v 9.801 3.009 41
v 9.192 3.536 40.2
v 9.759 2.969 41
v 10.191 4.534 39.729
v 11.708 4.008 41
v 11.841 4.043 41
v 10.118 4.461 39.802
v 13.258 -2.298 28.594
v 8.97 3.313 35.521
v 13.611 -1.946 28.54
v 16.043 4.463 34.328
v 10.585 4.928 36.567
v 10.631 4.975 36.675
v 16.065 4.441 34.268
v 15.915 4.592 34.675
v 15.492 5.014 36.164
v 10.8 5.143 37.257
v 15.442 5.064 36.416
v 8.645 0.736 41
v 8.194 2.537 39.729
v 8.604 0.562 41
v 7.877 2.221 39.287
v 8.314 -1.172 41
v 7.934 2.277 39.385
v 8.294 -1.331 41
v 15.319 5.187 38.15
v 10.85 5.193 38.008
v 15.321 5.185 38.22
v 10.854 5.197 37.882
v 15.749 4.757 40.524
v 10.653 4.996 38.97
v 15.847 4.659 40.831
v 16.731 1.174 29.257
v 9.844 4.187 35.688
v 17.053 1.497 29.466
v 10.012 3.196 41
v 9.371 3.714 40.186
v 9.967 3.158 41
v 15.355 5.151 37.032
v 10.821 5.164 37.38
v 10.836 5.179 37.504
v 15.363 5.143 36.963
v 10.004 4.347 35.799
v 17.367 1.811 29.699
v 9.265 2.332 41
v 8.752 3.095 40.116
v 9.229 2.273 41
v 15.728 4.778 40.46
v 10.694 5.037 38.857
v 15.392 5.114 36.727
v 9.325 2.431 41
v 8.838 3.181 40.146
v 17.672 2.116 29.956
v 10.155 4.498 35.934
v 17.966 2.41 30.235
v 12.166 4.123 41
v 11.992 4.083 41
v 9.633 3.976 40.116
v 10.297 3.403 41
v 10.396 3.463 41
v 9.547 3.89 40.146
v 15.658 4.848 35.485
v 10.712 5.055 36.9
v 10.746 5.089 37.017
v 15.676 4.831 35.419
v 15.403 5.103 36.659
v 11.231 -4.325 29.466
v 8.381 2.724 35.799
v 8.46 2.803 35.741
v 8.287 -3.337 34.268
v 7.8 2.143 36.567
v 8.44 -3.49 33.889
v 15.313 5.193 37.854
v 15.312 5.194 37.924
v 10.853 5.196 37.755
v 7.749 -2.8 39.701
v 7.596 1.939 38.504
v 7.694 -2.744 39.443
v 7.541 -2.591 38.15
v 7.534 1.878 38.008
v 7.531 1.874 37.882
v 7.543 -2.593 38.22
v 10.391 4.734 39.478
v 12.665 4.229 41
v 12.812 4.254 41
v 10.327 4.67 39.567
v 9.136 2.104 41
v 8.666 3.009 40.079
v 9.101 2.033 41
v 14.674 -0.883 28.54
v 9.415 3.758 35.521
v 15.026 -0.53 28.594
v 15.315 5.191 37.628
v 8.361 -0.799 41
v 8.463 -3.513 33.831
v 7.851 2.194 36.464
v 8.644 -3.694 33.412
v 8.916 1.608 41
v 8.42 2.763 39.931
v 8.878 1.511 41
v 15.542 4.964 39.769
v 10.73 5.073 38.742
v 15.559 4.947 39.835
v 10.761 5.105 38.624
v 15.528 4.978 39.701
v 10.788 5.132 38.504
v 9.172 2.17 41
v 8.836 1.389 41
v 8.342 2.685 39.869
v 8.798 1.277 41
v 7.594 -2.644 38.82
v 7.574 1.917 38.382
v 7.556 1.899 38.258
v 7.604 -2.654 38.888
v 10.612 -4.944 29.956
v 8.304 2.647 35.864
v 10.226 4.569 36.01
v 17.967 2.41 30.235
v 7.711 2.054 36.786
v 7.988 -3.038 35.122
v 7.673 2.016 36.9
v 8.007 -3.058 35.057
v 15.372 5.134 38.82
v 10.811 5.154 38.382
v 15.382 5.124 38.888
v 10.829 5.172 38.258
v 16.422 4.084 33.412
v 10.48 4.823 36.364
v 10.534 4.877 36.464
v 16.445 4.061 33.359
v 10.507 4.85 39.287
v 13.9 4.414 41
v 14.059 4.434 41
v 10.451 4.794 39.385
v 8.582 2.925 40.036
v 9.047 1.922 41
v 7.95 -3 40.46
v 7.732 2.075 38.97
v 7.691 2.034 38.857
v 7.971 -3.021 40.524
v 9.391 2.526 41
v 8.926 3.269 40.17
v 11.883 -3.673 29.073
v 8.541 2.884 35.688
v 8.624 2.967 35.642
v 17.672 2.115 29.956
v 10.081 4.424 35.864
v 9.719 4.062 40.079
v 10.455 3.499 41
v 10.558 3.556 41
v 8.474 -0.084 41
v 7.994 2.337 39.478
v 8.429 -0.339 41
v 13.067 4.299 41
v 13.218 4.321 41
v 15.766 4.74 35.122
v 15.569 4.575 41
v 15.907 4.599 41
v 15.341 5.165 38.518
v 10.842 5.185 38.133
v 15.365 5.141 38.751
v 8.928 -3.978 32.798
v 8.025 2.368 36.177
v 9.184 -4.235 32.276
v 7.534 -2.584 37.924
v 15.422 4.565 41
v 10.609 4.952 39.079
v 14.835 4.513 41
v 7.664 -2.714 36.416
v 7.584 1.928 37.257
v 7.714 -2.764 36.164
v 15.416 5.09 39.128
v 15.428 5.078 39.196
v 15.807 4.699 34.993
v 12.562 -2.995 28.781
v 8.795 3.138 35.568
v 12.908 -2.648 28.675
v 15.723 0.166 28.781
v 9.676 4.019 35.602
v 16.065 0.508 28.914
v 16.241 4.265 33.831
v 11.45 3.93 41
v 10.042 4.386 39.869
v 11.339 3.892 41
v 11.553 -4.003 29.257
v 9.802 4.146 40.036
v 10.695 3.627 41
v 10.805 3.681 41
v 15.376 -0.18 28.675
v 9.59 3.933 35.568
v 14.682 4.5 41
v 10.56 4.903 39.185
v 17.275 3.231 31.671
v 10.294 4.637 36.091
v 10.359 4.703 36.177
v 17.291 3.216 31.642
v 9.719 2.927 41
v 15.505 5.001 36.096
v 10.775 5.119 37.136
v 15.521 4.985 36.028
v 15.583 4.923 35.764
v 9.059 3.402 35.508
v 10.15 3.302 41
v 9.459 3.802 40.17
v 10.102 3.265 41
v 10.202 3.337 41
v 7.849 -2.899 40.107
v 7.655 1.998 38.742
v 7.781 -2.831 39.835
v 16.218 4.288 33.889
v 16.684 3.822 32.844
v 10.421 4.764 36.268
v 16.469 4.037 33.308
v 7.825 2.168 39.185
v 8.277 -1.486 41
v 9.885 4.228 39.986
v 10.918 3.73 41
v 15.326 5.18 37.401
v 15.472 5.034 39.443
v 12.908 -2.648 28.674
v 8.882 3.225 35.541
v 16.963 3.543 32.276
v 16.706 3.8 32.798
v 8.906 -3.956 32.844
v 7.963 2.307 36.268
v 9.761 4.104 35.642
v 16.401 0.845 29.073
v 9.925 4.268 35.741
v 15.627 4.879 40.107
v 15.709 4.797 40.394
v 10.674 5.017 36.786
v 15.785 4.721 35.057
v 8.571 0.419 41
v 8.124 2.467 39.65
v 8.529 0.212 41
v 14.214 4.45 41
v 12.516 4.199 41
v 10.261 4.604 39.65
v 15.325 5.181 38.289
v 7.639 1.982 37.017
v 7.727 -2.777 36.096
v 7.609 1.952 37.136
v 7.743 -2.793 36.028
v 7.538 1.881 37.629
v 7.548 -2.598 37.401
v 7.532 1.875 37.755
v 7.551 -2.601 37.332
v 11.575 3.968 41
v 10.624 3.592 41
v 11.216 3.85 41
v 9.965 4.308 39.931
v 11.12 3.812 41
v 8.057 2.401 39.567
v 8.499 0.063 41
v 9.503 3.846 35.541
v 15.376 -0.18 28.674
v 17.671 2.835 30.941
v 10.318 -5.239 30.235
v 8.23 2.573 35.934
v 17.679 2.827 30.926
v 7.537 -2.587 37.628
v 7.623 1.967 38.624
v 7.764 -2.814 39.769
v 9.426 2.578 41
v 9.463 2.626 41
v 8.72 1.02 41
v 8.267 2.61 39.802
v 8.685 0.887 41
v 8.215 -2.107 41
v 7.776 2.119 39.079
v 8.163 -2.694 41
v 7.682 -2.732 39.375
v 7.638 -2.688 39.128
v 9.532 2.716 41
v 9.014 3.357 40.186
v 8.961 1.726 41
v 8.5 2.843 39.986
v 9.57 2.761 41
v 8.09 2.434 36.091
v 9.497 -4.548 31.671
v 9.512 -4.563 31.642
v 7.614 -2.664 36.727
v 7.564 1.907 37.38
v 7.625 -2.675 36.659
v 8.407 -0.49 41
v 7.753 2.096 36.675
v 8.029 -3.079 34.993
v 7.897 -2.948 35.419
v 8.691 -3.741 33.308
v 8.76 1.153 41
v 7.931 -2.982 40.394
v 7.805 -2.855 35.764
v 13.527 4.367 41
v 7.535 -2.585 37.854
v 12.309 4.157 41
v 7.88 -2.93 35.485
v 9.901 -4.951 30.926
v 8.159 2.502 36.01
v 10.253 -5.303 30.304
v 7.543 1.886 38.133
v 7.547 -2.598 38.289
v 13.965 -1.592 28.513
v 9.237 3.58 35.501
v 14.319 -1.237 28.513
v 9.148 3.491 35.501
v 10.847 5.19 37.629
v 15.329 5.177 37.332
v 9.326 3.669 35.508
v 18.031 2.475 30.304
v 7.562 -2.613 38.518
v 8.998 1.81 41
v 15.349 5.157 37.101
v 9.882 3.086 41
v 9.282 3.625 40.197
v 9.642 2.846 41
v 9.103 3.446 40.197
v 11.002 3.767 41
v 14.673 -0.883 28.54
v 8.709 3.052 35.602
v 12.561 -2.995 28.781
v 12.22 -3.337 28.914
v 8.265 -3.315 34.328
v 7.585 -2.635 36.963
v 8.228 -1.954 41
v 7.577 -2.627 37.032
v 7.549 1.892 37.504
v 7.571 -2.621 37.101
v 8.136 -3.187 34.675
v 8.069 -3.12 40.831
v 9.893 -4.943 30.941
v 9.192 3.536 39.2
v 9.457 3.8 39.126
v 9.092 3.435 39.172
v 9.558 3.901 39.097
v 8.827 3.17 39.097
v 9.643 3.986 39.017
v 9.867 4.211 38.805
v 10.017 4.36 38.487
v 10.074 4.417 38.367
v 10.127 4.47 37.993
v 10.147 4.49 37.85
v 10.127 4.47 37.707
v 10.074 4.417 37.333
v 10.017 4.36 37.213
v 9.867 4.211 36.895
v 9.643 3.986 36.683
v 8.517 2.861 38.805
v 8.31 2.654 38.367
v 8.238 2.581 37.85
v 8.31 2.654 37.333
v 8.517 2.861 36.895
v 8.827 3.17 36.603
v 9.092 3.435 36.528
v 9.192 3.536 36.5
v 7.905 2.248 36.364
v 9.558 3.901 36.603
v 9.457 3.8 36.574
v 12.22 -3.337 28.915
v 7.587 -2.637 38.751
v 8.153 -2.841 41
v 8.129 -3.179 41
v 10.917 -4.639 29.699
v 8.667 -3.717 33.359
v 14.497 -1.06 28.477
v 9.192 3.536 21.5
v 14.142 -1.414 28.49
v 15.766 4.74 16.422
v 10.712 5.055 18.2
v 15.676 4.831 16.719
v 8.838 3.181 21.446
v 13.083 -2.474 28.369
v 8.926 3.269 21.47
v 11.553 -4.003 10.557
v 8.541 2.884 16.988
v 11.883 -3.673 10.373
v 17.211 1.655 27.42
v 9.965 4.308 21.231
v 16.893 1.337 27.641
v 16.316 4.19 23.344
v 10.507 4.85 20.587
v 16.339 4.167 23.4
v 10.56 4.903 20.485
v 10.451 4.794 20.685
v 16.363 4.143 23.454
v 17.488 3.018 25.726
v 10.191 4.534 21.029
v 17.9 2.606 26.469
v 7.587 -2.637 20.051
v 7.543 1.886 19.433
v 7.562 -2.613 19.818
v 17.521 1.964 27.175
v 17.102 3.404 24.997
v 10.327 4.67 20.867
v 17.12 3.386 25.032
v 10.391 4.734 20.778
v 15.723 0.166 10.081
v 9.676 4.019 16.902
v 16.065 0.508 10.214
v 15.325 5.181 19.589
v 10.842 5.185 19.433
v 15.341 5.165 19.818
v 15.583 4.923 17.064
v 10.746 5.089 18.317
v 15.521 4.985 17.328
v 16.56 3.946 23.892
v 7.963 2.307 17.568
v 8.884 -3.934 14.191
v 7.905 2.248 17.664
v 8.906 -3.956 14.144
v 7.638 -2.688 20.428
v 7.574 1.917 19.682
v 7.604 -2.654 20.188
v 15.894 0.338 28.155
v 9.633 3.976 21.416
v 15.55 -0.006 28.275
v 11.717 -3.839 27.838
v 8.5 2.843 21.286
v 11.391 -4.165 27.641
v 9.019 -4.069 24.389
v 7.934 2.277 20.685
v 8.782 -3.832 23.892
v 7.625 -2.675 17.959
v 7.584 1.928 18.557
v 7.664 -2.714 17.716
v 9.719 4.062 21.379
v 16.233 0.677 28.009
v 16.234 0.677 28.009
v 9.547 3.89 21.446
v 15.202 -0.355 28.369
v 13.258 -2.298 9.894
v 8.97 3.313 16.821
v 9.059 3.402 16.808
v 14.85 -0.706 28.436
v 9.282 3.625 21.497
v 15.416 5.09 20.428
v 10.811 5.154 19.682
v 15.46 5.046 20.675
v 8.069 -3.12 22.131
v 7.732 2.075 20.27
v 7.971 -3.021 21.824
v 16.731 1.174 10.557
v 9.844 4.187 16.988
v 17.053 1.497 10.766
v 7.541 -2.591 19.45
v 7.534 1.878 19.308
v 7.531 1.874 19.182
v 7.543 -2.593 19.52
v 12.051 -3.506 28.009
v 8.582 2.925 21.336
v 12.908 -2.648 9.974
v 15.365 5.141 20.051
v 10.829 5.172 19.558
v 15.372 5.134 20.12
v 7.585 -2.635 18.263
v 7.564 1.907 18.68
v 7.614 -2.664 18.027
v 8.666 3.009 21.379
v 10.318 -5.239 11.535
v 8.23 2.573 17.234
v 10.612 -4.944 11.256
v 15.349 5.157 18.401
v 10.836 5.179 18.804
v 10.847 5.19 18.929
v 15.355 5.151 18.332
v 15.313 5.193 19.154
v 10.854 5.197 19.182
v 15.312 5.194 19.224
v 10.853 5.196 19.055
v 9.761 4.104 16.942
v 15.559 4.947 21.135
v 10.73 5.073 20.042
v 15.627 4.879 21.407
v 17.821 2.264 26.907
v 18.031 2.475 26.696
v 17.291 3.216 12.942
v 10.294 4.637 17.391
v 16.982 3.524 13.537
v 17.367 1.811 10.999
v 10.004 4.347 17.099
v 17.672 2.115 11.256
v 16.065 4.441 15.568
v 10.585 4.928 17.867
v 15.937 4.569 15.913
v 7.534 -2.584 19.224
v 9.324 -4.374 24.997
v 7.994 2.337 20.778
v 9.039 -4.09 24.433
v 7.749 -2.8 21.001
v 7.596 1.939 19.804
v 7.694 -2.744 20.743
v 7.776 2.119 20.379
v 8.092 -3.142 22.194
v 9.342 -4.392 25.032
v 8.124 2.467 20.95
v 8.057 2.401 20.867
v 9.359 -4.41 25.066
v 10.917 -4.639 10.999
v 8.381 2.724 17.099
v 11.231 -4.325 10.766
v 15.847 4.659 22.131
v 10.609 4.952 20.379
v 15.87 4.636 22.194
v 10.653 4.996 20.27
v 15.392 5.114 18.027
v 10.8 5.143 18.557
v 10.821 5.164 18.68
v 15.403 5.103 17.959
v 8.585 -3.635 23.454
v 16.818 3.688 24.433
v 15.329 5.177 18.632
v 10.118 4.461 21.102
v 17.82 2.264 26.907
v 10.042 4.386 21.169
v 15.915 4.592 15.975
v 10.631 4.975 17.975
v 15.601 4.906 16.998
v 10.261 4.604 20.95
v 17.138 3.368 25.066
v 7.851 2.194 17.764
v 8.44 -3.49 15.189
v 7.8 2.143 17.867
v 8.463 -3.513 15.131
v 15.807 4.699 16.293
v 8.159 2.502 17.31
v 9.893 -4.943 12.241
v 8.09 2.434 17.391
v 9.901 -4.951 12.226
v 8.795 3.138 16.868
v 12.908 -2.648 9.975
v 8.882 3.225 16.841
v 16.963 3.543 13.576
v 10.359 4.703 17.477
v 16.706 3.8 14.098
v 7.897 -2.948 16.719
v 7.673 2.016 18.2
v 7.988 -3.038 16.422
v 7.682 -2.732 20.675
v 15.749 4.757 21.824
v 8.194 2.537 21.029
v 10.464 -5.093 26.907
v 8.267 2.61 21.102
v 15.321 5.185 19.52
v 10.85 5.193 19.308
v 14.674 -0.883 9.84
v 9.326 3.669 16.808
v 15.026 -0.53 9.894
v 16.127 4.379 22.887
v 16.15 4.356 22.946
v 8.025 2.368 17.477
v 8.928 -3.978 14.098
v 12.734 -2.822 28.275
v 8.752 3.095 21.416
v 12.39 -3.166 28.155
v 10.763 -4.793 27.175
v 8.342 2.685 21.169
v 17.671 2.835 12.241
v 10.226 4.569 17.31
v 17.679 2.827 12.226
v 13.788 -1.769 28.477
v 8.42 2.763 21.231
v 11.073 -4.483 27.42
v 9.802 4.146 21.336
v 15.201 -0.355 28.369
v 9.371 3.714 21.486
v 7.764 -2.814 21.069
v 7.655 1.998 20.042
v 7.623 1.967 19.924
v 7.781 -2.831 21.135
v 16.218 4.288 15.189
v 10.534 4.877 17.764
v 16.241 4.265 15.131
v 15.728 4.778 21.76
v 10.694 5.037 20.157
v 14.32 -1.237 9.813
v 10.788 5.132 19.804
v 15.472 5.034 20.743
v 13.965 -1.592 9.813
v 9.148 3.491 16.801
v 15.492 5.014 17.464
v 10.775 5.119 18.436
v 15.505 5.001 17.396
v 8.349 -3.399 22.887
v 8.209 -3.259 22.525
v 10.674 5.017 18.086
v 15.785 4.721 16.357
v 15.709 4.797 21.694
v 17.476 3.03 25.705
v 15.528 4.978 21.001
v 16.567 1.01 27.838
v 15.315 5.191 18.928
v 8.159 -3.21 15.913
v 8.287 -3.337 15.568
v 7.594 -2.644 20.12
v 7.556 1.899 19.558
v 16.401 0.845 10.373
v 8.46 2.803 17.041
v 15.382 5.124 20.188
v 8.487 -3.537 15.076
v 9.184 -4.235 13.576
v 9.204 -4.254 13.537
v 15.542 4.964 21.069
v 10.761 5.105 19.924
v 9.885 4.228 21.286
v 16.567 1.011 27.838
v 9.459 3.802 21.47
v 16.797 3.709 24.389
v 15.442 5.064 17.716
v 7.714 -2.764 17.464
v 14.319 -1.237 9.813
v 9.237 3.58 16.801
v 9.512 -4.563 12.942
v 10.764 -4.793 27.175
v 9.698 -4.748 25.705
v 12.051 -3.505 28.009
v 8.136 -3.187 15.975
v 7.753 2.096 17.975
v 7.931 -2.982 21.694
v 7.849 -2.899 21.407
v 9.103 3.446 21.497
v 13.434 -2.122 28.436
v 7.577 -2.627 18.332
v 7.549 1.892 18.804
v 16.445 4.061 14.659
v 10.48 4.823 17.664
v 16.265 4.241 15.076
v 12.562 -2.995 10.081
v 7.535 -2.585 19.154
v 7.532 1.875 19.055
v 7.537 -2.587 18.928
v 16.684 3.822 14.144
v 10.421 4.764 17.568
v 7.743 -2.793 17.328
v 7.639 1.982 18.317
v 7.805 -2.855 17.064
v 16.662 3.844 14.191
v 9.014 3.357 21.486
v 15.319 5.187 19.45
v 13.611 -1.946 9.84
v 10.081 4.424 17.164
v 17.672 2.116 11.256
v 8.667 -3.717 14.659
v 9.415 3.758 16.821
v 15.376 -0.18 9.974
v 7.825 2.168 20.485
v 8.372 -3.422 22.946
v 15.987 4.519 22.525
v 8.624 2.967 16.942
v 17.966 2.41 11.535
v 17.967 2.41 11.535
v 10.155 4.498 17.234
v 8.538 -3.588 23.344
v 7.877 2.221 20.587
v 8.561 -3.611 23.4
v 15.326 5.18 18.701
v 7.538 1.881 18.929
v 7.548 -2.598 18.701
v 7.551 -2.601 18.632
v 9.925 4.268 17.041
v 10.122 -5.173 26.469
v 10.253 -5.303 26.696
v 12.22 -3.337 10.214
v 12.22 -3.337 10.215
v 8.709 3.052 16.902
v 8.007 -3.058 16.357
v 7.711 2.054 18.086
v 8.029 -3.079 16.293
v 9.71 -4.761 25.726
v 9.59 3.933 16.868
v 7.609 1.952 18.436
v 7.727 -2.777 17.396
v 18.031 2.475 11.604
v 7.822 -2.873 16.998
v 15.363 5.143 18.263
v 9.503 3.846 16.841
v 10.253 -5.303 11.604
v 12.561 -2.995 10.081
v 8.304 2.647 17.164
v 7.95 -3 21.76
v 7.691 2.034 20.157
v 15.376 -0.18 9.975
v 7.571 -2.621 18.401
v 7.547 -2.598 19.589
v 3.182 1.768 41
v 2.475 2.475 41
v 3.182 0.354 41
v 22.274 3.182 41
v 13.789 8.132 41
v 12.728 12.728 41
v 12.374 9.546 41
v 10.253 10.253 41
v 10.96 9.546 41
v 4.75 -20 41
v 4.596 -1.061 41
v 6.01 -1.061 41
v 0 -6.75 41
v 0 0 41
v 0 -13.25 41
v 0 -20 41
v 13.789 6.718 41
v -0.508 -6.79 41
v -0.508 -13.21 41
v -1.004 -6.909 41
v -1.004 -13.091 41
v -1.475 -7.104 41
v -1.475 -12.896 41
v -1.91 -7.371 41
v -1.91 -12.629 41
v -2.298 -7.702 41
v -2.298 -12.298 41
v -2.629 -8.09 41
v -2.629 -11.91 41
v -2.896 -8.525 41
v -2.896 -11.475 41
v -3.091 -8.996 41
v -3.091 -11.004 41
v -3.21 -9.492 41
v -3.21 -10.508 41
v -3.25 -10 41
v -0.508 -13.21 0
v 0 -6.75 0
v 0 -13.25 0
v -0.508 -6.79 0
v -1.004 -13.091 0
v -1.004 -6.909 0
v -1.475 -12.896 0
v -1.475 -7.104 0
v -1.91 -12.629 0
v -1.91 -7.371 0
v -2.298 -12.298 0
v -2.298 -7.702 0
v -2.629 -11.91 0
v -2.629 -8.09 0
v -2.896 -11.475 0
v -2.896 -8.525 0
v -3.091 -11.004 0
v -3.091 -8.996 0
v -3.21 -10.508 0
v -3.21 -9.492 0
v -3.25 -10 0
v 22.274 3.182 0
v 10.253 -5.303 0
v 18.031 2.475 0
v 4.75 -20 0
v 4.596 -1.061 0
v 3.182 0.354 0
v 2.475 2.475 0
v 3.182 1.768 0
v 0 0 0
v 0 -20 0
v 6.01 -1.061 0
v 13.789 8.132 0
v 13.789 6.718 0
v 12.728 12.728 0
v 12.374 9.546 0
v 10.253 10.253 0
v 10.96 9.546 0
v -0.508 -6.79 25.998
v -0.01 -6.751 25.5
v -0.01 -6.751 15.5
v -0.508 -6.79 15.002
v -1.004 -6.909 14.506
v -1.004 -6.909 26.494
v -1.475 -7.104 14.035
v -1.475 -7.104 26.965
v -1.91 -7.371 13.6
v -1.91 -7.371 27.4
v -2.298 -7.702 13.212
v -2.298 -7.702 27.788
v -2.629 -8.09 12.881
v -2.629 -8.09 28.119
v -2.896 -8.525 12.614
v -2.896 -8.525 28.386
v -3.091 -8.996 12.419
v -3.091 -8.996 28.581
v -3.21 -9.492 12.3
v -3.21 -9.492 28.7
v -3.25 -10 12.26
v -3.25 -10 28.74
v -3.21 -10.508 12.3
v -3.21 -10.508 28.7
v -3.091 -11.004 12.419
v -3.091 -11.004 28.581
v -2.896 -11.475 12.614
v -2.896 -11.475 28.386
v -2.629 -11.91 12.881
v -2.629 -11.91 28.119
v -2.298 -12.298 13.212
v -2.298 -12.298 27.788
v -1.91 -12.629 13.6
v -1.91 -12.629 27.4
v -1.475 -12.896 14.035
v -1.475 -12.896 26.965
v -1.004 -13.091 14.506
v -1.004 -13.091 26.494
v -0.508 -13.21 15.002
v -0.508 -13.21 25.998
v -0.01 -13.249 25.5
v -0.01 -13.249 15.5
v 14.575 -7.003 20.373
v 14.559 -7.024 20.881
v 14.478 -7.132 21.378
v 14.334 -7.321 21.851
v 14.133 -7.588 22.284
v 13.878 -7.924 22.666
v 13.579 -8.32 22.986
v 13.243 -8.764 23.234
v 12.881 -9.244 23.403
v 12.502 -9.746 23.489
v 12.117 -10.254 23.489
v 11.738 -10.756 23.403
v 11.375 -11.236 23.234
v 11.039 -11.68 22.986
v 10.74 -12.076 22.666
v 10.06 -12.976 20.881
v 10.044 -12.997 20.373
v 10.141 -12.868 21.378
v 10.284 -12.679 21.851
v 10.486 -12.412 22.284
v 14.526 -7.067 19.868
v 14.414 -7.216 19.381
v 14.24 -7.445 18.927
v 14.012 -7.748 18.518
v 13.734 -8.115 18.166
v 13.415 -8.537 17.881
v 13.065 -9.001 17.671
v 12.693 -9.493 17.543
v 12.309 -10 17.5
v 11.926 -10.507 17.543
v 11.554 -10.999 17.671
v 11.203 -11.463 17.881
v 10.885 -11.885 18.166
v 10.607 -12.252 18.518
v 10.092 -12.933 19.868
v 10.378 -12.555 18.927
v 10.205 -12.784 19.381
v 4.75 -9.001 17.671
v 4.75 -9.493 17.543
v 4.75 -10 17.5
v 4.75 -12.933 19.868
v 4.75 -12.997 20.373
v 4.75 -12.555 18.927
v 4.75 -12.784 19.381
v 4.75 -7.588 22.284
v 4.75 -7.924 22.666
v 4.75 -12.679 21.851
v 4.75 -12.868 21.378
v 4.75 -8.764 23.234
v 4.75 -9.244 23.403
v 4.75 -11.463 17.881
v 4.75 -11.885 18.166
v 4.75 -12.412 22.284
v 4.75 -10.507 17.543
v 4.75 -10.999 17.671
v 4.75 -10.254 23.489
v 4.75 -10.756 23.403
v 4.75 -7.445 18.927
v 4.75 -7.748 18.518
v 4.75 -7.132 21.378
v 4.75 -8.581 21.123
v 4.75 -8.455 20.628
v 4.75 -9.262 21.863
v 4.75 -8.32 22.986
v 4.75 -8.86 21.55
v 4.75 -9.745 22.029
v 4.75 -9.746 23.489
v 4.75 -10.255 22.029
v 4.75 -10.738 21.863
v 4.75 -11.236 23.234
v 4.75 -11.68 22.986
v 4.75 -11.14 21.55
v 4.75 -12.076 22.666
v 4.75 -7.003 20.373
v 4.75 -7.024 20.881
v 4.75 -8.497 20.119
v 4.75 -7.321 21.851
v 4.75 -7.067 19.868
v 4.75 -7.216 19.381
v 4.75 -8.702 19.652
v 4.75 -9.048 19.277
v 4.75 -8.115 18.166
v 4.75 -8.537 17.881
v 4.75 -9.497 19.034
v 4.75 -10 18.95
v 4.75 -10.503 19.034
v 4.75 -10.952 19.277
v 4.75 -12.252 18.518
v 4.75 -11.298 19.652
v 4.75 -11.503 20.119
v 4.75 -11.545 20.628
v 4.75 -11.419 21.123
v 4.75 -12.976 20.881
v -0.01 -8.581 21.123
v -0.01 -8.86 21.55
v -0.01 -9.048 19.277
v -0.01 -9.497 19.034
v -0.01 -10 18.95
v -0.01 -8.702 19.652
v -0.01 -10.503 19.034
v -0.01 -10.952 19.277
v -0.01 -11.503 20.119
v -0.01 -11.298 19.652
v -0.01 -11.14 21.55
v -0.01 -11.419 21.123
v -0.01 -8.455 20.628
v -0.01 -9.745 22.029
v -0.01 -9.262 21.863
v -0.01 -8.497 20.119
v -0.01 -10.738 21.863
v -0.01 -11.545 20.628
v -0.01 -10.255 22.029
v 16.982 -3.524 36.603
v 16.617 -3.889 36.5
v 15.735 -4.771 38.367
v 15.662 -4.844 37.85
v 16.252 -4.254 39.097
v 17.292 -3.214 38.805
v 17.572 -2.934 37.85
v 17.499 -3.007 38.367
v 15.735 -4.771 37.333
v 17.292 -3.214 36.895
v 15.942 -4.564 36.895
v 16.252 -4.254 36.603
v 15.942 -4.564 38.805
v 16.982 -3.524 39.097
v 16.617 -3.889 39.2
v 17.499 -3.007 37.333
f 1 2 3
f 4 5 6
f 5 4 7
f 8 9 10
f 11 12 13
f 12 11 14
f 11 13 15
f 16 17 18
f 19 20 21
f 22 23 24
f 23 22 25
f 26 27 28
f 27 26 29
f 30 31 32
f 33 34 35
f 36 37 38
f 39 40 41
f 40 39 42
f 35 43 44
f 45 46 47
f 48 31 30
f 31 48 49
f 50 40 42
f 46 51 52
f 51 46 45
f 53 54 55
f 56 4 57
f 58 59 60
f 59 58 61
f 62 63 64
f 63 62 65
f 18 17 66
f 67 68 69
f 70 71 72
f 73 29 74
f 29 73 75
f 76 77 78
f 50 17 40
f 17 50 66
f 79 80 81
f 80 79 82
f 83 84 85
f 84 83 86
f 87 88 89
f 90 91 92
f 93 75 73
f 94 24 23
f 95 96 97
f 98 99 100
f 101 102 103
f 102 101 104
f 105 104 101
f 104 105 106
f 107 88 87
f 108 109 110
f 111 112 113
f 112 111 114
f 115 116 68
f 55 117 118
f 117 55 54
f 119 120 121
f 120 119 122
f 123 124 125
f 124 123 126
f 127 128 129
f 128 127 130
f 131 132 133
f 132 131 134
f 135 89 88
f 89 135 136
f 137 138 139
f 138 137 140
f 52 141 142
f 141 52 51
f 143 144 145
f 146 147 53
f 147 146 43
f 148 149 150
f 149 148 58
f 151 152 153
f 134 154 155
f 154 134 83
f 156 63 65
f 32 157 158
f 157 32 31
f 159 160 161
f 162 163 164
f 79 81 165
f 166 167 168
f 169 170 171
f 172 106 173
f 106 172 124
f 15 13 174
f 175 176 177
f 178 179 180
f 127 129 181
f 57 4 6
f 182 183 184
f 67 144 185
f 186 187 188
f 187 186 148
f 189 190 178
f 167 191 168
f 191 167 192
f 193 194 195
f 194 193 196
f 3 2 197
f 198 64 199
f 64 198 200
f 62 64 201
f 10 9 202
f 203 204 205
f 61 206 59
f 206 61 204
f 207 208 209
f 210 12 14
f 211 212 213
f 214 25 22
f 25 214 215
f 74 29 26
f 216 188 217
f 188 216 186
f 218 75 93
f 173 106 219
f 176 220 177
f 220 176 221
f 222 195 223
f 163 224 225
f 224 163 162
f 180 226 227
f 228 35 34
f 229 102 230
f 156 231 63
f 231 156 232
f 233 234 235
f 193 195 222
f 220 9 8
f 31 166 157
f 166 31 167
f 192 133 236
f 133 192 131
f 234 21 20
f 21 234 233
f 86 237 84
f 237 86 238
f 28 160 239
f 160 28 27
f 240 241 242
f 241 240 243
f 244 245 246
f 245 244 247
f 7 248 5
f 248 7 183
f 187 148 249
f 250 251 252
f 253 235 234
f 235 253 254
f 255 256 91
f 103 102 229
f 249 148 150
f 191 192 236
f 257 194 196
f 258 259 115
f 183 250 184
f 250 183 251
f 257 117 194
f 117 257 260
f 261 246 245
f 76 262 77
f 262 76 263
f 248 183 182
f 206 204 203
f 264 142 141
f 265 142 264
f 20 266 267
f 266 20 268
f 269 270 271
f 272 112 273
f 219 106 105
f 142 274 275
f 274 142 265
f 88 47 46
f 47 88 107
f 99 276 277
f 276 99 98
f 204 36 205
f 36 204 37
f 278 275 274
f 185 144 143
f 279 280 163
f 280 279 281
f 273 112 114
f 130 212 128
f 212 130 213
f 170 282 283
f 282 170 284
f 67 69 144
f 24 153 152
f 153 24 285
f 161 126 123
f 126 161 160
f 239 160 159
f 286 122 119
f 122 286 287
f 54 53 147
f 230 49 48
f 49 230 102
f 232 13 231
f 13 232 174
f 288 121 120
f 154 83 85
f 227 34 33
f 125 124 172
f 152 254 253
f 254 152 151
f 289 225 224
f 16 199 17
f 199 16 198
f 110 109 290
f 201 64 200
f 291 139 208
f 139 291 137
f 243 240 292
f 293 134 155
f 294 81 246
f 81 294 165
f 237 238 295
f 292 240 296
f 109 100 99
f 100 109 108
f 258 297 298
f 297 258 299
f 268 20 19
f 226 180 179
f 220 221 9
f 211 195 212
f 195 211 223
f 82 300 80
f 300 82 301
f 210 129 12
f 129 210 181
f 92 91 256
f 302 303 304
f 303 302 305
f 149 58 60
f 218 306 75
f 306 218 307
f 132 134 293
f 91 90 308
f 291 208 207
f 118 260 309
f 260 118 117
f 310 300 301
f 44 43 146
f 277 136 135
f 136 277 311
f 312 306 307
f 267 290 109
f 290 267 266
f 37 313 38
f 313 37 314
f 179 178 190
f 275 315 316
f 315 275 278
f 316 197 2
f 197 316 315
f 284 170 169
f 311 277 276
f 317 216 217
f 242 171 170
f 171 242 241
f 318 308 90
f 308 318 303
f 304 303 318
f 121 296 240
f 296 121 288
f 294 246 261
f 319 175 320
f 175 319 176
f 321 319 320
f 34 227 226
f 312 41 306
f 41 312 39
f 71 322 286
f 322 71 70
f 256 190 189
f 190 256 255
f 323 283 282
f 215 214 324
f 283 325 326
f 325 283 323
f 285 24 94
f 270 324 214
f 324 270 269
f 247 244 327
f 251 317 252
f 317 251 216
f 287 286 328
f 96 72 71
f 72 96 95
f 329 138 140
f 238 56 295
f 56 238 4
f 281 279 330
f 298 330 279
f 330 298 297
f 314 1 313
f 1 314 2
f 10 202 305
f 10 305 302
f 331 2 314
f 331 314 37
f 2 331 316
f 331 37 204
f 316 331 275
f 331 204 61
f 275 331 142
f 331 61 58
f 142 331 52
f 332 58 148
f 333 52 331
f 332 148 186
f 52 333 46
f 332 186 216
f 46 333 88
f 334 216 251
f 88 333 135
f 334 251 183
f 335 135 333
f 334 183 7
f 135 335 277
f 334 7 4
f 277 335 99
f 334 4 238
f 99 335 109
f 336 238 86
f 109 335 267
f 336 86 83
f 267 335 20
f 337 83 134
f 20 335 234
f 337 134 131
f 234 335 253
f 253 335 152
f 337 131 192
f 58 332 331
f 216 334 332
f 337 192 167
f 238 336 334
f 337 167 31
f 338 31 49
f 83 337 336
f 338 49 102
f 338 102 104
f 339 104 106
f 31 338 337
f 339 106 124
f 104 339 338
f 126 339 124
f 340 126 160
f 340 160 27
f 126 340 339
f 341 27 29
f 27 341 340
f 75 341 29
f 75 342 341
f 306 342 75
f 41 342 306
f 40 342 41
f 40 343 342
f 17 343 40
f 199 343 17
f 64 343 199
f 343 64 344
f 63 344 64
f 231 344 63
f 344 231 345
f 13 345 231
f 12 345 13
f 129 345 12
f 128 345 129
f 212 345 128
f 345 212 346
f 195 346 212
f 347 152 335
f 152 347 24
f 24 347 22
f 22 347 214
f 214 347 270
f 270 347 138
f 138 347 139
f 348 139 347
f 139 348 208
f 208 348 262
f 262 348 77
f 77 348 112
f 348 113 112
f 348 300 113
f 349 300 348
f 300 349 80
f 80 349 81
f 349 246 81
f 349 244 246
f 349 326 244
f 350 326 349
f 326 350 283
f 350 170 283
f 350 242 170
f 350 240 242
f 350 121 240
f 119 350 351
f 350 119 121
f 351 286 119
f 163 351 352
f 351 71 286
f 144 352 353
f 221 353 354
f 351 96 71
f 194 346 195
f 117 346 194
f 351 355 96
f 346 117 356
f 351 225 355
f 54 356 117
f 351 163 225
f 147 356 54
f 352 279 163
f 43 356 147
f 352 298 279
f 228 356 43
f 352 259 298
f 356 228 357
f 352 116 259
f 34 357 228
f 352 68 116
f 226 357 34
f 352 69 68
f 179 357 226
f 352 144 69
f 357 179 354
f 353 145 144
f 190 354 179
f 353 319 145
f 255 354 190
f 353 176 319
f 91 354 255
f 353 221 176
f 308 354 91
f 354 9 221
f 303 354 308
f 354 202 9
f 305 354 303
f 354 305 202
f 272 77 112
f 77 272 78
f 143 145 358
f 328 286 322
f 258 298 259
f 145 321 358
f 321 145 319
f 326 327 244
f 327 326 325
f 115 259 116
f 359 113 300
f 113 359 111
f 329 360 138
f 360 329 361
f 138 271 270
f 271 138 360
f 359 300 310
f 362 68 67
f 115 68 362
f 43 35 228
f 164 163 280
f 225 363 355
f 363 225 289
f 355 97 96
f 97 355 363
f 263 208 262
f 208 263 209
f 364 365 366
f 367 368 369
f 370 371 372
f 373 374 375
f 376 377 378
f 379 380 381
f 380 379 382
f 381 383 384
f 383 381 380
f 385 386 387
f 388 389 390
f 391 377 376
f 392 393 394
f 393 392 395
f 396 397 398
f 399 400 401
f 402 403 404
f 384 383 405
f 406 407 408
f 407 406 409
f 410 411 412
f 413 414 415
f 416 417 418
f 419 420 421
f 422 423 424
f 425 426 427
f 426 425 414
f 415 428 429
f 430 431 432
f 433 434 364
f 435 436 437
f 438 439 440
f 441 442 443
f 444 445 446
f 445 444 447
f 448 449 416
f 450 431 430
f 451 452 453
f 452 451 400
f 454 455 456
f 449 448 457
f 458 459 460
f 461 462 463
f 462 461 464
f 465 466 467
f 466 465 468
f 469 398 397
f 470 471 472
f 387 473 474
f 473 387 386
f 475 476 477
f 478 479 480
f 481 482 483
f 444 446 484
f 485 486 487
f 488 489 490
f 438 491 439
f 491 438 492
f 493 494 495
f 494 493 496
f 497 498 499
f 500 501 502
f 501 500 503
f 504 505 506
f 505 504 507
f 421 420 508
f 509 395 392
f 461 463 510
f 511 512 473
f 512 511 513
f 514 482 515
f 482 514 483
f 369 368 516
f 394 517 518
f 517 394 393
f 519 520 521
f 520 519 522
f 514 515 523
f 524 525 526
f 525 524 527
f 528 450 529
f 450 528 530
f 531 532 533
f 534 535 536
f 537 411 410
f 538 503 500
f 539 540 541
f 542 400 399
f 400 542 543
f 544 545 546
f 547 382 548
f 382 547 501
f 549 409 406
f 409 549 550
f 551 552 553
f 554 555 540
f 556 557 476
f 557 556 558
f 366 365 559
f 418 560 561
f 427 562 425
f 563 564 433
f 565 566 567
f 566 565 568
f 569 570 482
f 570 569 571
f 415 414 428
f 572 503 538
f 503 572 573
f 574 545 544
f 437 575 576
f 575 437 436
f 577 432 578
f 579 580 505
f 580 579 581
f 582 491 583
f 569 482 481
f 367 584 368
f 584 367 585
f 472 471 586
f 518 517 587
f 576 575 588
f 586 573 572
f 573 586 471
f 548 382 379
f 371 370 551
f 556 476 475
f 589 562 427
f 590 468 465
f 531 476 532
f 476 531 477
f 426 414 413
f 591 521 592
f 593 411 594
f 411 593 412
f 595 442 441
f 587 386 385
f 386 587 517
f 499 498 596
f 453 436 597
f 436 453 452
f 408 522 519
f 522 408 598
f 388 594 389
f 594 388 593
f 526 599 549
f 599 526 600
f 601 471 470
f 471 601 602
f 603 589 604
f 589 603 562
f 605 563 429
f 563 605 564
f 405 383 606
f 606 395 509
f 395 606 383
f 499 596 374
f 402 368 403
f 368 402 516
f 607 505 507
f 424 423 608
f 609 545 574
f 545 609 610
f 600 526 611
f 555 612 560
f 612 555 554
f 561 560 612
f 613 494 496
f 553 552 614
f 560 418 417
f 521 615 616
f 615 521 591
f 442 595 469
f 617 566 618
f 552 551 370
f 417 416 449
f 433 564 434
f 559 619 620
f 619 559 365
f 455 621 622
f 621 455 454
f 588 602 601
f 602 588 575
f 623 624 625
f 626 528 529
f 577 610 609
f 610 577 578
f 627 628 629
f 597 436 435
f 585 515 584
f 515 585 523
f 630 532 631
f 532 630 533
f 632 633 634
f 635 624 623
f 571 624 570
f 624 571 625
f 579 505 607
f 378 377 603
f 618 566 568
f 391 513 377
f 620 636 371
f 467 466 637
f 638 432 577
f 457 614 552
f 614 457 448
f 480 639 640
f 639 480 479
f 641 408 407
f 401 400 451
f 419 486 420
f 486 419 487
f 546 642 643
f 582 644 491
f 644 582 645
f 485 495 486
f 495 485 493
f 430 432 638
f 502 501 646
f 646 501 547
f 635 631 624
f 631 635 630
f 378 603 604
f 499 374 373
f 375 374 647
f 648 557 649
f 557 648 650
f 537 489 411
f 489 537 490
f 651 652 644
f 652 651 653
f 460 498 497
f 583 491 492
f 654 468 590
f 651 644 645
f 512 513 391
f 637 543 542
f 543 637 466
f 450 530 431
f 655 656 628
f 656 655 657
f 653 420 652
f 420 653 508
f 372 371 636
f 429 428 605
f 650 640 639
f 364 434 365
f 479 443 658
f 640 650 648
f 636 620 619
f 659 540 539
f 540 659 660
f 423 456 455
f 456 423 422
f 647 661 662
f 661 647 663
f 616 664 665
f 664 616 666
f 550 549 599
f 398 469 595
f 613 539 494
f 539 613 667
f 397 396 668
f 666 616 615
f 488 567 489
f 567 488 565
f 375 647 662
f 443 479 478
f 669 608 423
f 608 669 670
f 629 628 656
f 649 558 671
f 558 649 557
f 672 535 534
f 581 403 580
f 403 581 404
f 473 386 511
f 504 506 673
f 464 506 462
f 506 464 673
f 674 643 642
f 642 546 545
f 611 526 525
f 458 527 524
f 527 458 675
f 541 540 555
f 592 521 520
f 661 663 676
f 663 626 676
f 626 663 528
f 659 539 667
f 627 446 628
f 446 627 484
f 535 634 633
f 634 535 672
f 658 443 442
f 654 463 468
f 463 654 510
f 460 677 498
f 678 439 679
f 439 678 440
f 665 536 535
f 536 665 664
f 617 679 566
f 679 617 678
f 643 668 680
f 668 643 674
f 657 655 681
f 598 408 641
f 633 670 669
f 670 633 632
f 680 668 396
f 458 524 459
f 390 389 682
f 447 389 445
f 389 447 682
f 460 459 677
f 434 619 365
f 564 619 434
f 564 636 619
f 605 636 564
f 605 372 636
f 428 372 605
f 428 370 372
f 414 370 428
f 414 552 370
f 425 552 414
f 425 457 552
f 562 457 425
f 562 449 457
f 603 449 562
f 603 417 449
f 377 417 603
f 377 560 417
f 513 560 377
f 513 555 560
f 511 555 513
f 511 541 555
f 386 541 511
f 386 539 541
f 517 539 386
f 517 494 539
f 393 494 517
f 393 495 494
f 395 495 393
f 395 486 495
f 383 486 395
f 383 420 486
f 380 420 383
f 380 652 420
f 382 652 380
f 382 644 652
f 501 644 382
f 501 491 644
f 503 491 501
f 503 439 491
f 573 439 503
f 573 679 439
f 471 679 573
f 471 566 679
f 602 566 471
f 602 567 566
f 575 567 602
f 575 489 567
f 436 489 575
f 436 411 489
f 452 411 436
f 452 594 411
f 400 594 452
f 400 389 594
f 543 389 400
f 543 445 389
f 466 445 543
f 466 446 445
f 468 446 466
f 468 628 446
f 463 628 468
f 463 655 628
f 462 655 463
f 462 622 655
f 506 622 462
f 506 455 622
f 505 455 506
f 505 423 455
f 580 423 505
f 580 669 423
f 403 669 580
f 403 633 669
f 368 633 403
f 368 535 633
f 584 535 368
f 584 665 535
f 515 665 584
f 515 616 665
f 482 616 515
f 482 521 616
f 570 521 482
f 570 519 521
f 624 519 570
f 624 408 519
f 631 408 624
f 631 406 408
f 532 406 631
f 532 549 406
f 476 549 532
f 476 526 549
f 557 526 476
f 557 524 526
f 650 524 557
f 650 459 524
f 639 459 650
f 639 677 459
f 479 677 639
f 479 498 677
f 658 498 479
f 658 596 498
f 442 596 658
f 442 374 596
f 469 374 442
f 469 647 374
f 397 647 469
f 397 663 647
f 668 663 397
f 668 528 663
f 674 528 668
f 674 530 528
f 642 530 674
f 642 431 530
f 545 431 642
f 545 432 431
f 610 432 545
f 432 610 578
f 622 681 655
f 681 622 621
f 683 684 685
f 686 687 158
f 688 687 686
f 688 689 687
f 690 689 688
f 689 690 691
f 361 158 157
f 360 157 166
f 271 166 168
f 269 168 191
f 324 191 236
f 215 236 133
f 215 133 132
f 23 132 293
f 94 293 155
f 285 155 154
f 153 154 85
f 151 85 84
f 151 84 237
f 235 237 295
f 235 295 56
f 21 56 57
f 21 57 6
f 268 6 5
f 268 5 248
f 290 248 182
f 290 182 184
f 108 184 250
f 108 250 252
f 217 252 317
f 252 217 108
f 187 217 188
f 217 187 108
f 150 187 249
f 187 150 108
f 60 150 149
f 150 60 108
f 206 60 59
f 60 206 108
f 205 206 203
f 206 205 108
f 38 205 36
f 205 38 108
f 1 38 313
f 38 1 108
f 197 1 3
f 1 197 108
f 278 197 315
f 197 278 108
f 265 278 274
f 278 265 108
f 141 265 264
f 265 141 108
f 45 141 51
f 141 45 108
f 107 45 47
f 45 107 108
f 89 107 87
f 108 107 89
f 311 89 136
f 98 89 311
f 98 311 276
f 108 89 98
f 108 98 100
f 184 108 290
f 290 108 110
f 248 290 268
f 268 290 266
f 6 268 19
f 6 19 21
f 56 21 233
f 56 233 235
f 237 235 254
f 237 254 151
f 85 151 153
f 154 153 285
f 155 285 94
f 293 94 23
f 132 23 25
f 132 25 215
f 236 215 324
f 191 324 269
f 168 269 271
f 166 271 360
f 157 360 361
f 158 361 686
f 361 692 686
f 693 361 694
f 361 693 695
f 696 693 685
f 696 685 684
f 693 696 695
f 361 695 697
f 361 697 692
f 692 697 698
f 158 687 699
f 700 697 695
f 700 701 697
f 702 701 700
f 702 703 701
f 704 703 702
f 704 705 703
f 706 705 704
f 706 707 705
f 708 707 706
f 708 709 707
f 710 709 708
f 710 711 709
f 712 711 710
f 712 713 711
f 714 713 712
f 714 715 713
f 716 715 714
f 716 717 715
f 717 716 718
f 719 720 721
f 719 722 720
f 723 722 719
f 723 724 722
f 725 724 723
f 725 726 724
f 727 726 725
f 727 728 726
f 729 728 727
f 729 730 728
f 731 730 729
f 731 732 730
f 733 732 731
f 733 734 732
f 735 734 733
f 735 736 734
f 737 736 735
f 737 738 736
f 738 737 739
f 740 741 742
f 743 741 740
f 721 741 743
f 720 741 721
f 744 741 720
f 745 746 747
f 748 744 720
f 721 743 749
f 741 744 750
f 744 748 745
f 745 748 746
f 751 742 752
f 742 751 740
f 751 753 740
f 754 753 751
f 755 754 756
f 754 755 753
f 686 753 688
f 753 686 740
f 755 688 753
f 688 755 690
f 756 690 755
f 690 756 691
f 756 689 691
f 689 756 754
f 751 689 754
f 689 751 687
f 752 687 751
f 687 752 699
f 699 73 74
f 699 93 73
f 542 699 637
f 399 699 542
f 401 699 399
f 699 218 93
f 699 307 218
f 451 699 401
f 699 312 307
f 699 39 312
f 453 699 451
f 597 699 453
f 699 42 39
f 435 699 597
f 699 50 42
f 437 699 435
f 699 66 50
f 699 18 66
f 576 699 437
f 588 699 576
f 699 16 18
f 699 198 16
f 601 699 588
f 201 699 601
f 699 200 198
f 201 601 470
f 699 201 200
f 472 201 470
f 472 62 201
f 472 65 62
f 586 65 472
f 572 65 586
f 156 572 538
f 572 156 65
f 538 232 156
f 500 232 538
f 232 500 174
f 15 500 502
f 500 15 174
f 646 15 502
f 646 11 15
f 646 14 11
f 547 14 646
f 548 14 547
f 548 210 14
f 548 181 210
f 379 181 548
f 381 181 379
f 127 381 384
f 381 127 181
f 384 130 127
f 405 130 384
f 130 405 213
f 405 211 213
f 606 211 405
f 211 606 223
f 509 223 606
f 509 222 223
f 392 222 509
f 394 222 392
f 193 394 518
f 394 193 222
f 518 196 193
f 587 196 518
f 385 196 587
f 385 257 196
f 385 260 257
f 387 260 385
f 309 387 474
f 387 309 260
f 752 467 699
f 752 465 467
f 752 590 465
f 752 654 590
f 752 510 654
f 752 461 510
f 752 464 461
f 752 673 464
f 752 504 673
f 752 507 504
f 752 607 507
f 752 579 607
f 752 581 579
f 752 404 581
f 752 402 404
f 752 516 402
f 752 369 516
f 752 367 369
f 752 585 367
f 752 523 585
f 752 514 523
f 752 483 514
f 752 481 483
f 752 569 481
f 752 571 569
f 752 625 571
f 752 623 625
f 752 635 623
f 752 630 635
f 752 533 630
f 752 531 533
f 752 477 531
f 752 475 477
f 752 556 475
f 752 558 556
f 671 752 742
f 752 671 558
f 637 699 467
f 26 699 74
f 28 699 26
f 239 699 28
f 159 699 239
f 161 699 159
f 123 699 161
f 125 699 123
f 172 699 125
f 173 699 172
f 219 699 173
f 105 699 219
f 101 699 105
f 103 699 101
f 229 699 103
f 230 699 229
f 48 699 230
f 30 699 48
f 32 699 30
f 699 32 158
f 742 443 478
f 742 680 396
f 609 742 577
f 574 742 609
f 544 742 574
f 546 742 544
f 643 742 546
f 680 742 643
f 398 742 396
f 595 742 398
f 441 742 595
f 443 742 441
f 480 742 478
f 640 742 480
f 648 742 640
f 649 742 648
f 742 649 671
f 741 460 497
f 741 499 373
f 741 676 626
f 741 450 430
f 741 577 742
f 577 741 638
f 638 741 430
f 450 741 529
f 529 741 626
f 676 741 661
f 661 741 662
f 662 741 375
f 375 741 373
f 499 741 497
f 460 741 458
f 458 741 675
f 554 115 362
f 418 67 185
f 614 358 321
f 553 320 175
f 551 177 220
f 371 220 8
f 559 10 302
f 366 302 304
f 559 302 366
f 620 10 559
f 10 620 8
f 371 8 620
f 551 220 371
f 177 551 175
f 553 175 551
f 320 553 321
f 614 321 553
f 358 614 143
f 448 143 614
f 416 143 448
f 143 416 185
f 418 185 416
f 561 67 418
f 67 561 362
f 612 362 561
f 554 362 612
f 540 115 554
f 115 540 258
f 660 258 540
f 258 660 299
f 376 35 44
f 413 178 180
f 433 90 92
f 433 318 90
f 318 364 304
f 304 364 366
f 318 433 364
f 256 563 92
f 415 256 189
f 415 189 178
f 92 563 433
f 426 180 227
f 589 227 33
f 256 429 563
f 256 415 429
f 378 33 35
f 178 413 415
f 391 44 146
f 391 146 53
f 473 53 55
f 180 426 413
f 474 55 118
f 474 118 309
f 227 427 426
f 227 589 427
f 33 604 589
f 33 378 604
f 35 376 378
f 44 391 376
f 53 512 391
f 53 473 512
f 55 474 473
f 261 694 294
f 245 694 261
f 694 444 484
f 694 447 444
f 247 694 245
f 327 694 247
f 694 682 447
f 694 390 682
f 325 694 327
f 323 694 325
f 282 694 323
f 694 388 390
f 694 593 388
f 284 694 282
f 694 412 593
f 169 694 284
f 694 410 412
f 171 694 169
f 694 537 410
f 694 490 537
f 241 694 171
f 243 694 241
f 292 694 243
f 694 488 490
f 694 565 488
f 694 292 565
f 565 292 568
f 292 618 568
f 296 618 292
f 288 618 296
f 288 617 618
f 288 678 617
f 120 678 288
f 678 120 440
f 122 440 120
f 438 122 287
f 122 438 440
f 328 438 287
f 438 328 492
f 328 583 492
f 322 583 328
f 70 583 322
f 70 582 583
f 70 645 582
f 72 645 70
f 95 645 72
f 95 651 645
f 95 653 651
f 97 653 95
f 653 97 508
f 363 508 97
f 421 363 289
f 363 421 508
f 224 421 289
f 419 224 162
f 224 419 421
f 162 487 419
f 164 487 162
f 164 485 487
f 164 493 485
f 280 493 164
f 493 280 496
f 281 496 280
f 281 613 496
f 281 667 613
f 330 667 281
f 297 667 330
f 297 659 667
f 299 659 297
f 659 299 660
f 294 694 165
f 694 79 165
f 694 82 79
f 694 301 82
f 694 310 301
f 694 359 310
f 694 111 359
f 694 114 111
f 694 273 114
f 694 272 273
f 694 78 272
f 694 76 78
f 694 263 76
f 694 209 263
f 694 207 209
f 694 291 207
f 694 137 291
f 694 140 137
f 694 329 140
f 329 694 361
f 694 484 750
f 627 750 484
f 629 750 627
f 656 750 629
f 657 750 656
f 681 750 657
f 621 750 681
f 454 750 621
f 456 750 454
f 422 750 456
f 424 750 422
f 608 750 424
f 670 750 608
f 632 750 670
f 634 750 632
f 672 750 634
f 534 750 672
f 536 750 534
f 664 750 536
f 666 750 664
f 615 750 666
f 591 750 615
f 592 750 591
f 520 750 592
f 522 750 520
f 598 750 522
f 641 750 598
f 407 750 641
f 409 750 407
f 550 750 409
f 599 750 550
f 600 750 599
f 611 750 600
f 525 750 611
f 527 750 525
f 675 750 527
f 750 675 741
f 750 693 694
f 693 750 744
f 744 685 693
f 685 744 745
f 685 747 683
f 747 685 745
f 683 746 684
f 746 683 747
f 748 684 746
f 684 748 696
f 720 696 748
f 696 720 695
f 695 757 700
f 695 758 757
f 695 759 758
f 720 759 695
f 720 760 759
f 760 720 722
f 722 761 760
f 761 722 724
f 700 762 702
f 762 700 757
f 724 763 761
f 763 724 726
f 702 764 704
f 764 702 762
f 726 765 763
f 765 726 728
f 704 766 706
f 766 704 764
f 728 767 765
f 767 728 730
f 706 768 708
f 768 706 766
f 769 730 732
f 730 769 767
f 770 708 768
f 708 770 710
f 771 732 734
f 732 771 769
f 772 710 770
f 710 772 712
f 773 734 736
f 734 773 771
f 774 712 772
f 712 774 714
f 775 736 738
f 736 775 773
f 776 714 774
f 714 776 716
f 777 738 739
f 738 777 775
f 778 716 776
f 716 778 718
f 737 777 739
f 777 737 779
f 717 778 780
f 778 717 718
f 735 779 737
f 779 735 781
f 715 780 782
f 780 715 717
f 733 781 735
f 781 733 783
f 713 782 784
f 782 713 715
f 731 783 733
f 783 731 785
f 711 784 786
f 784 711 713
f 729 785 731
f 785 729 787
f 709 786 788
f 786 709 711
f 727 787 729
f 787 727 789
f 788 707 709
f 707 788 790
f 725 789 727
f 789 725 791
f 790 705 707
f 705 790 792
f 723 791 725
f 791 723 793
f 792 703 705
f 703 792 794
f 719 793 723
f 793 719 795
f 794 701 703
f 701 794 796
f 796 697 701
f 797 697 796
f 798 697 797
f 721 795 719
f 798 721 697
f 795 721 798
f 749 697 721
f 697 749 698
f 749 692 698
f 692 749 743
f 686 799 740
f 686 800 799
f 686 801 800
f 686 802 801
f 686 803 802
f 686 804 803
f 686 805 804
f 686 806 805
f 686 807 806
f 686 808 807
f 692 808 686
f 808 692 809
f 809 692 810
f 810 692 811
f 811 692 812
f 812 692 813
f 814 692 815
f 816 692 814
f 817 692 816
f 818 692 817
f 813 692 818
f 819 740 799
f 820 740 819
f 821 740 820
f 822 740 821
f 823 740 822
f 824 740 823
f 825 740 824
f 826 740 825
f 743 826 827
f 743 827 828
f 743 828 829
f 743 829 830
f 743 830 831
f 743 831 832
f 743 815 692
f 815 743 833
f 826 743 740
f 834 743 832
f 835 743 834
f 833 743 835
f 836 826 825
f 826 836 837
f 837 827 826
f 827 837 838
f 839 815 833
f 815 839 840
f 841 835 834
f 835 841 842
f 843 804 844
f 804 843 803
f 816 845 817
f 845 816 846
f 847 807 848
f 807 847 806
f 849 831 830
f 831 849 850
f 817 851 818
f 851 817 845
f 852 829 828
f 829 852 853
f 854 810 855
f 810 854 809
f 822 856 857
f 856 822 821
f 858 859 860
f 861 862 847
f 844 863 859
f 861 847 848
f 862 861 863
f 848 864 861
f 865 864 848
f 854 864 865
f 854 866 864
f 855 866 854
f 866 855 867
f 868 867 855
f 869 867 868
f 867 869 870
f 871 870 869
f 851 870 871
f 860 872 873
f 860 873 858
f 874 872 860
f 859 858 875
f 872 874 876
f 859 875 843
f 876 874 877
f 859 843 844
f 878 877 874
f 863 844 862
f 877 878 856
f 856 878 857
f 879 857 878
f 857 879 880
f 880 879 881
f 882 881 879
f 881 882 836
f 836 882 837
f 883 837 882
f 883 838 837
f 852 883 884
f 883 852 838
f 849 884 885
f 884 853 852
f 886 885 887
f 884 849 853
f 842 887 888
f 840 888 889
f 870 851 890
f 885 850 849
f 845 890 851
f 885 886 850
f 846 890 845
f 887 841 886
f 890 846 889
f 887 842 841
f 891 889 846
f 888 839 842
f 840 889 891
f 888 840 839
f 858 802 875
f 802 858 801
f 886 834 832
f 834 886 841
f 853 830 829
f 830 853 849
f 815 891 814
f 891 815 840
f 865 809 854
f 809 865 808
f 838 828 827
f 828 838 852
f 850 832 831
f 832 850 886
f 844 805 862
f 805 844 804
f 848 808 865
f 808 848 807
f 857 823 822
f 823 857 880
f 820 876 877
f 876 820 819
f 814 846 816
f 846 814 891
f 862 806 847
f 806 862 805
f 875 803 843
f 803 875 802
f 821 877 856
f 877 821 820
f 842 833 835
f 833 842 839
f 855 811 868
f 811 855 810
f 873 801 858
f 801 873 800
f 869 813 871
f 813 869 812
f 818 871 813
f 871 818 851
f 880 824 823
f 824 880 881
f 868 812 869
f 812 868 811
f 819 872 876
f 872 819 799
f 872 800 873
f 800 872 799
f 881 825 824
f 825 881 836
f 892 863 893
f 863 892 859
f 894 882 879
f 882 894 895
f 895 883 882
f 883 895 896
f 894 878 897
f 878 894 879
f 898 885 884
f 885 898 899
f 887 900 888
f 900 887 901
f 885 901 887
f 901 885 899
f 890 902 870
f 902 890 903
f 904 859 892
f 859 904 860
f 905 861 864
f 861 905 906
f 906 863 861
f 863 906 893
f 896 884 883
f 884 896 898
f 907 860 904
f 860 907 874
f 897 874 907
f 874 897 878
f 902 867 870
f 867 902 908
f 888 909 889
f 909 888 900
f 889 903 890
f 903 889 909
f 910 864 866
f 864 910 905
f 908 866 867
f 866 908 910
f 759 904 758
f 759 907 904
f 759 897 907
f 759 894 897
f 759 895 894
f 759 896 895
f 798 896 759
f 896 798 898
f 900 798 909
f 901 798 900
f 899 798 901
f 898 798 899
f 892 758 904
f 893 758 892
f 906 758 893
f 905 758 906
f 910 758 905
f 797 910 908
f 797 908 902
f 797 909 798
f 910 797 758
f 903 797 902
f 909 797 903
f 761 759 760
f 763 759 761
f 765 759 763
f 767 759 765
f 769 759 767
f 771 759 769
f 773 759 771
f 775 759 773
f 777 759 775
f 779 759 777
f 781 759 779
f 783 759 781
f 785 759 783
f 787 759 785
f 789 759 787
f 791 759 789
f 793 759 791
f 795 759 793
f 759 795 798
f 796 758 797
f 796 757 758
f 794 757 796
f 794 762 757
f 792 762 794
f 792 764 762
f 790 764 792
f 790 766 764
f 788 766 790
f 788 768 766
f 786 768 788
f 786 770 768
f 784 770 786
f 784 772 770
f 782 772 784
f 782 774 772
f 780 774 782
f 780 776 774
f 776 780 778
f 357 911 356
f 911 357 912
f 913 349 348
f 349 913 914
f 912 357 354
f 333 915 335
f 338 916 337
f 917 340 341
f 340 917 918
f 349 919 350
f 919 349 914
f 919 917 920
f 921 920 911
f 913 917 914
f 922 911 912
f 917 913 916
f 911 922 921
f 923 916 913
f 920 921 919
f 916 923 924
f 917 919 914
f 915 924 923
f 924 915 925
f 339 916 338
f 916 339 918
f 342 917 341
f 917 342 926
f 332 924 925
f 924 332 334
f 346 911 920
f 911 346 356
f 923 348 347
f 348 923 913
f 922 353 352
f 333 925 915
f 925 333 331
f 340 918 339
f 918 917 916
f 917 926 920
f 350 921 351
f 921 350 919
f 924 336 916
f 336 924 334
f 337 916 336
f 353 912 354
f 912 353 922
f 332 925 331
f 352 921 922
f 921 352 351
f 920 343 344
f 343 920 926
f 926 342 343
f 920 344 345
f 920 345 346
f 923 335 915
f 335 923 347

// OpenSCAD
// The angle to tilt pcb
tilt_angle = 45;

/* [Hidden] */
layer_height=.2; extrusion_width=.5;
epsilon=.01;

module ppmount(
 size_pcb = [41,13,2],
 h_standoff = 7,
 offset_hole = 1.6+3.1/2,
 d_screwhole = 2.7,
 h_over = 4-2,
 s = 2.5,
 d_mountscrewhole=3.1,
 w_ext = 20,
 w_slot = 6.5,
 depth_slot = 6.5,
 l_mountscrew = 8,
 d_mountscrewhead = 6,
 h_mountscrewhead = 3,
 depth_slide = 1,
 w_tnut = 10,
 a_tilt = 45,
) {
 fnd=PI*2;
 s_screw = 2*extrusion_width;

 d2 = d_screwhole+2*s_screw;
 d1 = d2+2*h_standoff;
 h_mount = l_mountscrew-depth_slot/2;
 
 difference() {
  union() {
   linear_extrude(height=size_pcb.x,convexity=16)
   difference() {
    union() {
     hull() {
      rotate([0,0,-a_tilt])
      square(size=[h_over+size_pcb.z+h_standoff+s,s+size_pcb.y+s]);
      mirror([0,1]) square([h_mount,w_ext]);
      
     }//hull
     translate([0,-w_ext/2])
     circle(d=w_slot,$fn=w_slot*fnd);
    }//union
    rotate([0,0,-a_tilt]) {
     translate([-1,s+depth_slide])
     square(size=[1+h_over+size_pcb.z+h_standoff,size_pcb.y-2*depth_slide]);
     hull() translate([h_over+size_pcb.z/2,s+size_pcb.y/2]) {
      square(size=[size_pcb.z,size_pcb.y],center=true);
      square(size=[size_pcb.z+2*depth_slide,size_pcb.y-2*depth_slide],center=true);
     }
    }//rotate
   }//difference
   rotate([0,0,-a_tilt])
   intersection() {
    for(z=[offset_hole,offset_hole+d1])
    translate([h_over+size_pcb.z+h_standoff+epsilon,s+size_pcb.y/2,size_pcb.x-z])
    rotate([0,-90,0])
    cylinder(d1=d1,d2=d2,h=h_standoff+epsilon,$fn=d1*fnd);
    translate([0,s,0])
    cube(size=[h_over+size_pcb.z+h_standoff+1,size_pcb.y,size_pcb.x]);
   }//intersection
  }//union
  // 2020 mount
  translate([0,-w_ext/2,size_pcb.x/2]) rotate([0,90,0]) {
   translate([0,0,h_mount])
   cylinder(d=d_mountscrewhead,h=h_over+size_pcb.z+h_standoff+s+1,$fn=d_mountscrewhead*fnd);
   translate([0,0,-1])
   cylinder(d=d_mountscrewhole,h=h_over+size_pcb.z+h_standoff+s+2,$fn=d_mountscrewhole*fnd);
  }
  // T-nut cutout
  hull()
  for(sz=[-1,1]) translate([-epsilon,0,size_pcb.x/2+sz*w_tnut/2])
  rotate([0,-135,0])
  translate([0,-w_slot/2-1-w_ext/2,0])
  cube(size=[w_slot*sqrt(2)/2+2,w_slot+2,w_slot*sqrt(2)/2+2]);
  // pcb mount
  rotate([0,0,-a_tilt])
  translate([0,s+size_pcb.y/2,size_pcb.x-offset_hole]) rotate([0,90,0])
  cylinder(d=d_screwhole,h=h_over+size_pcb.z+h_standoff+s+1,$fn=d_screwhole*fnd);
 }//difference
 
 * difference() {
  union() {
   linear_extrude(height=size_pcb.x,convexity=16) {
    polygon(points=[
     [0,0],[0,s+depth_slide],
     // side
     [h_over-depth_slide,s+depth_slide],[h_over,s],
     [h_over+size_pcb.z,s], [h_over+size_pcb.z+depth_slide,s+depth_slide],
     [h_over+size_pcb.z+h_standoff,s+depth_slide],
     // bottom
     [h_over+size_pcb.z+h_standoff,s+size_pcb.y-depth_slide],
     // side
     [h_over+size_pcb.z+depth_slide,s+size_pcb.y-depth_slide],
     [h_over+size_pcb.z,s+size_pcb.y],[h_over,s+size_pcb.y],
     [h_over-depth_slide,s+size_pcb.y-depth_slide],
     [0,s+size_pcb.y-depth_slide],
     // outside
     [0,s+size_pcb.y+s],[h_over+size_pcb.z+h_standoff+s,s+size_pcb.y+s],
     [h_over+size_pcb.z+h_standoff+s,0],
     // 2020 mount part
     [h_mount,-w_ext],[0,-w_ext]
    ],convexity=16);
    translate([0,-w_ext/2])
    circle(d=w_slot,$fn=w_slot*fnd);
   }//linear_extrude
   intersection() {
    for(z=[offset_hole,offset_hole+d1])
    translate([h_over+size_pcb.z+h_standoff+epsilon,s+size_pcb.y/2,z])
    rotate([0,-90,0])
    cylinder(d1=d1,d2=d2,h=h_standoff+epsilon,$fn=d1*fnd);
    translate([0,s,0])
    cube(size=[h_over+size_pcb.z+h_standoff+1,size_pcb.y,size_pcb.x]);
   }//intersection
  }//union
  // 2020 mount
  translate([0,-w_ext/2,size_pcb.x/2]) rotate([0,90,0]) {
   translate([0,0,h_mount])
   cylinder(d=d_mountscrewhead,h=h_over+size_pcb.z+h_standoff+s+1,$fn=d_mountscrewhead*fnd);
   translate([0,0,-1])
   cylinder(d=d_mountscrewhole,h=h_over+size_pcb.z+h_standoff+s+2,$fn=d_mountscrewhole*fnd);
  }
  // pcb mount
  translate([0,s+size_pcb.y/2,offset_hole]) rotate([0,90,0])
  cylinder(d=d_screwhole,h=h_over+size_pcb.z+h_standoff+s+1,$fn=d_screwhole*fnd);
  // T-nut cutout
  hull()
  for(sz=[-1,1]) translate([-epsilon,0,size_pcb.x/2+sz*w_tnut/2])
  rotate([0,-135,0])
  translate([0,-w_slot/2-1-w_ext/2,0])
  cube(size=[w_slot*sqrt(2)/2+2,w_slot+2,w_slot*sqrt(2)/2+2]);
 }//difference
}

ppmount(a_tilt = tilt_angle);
